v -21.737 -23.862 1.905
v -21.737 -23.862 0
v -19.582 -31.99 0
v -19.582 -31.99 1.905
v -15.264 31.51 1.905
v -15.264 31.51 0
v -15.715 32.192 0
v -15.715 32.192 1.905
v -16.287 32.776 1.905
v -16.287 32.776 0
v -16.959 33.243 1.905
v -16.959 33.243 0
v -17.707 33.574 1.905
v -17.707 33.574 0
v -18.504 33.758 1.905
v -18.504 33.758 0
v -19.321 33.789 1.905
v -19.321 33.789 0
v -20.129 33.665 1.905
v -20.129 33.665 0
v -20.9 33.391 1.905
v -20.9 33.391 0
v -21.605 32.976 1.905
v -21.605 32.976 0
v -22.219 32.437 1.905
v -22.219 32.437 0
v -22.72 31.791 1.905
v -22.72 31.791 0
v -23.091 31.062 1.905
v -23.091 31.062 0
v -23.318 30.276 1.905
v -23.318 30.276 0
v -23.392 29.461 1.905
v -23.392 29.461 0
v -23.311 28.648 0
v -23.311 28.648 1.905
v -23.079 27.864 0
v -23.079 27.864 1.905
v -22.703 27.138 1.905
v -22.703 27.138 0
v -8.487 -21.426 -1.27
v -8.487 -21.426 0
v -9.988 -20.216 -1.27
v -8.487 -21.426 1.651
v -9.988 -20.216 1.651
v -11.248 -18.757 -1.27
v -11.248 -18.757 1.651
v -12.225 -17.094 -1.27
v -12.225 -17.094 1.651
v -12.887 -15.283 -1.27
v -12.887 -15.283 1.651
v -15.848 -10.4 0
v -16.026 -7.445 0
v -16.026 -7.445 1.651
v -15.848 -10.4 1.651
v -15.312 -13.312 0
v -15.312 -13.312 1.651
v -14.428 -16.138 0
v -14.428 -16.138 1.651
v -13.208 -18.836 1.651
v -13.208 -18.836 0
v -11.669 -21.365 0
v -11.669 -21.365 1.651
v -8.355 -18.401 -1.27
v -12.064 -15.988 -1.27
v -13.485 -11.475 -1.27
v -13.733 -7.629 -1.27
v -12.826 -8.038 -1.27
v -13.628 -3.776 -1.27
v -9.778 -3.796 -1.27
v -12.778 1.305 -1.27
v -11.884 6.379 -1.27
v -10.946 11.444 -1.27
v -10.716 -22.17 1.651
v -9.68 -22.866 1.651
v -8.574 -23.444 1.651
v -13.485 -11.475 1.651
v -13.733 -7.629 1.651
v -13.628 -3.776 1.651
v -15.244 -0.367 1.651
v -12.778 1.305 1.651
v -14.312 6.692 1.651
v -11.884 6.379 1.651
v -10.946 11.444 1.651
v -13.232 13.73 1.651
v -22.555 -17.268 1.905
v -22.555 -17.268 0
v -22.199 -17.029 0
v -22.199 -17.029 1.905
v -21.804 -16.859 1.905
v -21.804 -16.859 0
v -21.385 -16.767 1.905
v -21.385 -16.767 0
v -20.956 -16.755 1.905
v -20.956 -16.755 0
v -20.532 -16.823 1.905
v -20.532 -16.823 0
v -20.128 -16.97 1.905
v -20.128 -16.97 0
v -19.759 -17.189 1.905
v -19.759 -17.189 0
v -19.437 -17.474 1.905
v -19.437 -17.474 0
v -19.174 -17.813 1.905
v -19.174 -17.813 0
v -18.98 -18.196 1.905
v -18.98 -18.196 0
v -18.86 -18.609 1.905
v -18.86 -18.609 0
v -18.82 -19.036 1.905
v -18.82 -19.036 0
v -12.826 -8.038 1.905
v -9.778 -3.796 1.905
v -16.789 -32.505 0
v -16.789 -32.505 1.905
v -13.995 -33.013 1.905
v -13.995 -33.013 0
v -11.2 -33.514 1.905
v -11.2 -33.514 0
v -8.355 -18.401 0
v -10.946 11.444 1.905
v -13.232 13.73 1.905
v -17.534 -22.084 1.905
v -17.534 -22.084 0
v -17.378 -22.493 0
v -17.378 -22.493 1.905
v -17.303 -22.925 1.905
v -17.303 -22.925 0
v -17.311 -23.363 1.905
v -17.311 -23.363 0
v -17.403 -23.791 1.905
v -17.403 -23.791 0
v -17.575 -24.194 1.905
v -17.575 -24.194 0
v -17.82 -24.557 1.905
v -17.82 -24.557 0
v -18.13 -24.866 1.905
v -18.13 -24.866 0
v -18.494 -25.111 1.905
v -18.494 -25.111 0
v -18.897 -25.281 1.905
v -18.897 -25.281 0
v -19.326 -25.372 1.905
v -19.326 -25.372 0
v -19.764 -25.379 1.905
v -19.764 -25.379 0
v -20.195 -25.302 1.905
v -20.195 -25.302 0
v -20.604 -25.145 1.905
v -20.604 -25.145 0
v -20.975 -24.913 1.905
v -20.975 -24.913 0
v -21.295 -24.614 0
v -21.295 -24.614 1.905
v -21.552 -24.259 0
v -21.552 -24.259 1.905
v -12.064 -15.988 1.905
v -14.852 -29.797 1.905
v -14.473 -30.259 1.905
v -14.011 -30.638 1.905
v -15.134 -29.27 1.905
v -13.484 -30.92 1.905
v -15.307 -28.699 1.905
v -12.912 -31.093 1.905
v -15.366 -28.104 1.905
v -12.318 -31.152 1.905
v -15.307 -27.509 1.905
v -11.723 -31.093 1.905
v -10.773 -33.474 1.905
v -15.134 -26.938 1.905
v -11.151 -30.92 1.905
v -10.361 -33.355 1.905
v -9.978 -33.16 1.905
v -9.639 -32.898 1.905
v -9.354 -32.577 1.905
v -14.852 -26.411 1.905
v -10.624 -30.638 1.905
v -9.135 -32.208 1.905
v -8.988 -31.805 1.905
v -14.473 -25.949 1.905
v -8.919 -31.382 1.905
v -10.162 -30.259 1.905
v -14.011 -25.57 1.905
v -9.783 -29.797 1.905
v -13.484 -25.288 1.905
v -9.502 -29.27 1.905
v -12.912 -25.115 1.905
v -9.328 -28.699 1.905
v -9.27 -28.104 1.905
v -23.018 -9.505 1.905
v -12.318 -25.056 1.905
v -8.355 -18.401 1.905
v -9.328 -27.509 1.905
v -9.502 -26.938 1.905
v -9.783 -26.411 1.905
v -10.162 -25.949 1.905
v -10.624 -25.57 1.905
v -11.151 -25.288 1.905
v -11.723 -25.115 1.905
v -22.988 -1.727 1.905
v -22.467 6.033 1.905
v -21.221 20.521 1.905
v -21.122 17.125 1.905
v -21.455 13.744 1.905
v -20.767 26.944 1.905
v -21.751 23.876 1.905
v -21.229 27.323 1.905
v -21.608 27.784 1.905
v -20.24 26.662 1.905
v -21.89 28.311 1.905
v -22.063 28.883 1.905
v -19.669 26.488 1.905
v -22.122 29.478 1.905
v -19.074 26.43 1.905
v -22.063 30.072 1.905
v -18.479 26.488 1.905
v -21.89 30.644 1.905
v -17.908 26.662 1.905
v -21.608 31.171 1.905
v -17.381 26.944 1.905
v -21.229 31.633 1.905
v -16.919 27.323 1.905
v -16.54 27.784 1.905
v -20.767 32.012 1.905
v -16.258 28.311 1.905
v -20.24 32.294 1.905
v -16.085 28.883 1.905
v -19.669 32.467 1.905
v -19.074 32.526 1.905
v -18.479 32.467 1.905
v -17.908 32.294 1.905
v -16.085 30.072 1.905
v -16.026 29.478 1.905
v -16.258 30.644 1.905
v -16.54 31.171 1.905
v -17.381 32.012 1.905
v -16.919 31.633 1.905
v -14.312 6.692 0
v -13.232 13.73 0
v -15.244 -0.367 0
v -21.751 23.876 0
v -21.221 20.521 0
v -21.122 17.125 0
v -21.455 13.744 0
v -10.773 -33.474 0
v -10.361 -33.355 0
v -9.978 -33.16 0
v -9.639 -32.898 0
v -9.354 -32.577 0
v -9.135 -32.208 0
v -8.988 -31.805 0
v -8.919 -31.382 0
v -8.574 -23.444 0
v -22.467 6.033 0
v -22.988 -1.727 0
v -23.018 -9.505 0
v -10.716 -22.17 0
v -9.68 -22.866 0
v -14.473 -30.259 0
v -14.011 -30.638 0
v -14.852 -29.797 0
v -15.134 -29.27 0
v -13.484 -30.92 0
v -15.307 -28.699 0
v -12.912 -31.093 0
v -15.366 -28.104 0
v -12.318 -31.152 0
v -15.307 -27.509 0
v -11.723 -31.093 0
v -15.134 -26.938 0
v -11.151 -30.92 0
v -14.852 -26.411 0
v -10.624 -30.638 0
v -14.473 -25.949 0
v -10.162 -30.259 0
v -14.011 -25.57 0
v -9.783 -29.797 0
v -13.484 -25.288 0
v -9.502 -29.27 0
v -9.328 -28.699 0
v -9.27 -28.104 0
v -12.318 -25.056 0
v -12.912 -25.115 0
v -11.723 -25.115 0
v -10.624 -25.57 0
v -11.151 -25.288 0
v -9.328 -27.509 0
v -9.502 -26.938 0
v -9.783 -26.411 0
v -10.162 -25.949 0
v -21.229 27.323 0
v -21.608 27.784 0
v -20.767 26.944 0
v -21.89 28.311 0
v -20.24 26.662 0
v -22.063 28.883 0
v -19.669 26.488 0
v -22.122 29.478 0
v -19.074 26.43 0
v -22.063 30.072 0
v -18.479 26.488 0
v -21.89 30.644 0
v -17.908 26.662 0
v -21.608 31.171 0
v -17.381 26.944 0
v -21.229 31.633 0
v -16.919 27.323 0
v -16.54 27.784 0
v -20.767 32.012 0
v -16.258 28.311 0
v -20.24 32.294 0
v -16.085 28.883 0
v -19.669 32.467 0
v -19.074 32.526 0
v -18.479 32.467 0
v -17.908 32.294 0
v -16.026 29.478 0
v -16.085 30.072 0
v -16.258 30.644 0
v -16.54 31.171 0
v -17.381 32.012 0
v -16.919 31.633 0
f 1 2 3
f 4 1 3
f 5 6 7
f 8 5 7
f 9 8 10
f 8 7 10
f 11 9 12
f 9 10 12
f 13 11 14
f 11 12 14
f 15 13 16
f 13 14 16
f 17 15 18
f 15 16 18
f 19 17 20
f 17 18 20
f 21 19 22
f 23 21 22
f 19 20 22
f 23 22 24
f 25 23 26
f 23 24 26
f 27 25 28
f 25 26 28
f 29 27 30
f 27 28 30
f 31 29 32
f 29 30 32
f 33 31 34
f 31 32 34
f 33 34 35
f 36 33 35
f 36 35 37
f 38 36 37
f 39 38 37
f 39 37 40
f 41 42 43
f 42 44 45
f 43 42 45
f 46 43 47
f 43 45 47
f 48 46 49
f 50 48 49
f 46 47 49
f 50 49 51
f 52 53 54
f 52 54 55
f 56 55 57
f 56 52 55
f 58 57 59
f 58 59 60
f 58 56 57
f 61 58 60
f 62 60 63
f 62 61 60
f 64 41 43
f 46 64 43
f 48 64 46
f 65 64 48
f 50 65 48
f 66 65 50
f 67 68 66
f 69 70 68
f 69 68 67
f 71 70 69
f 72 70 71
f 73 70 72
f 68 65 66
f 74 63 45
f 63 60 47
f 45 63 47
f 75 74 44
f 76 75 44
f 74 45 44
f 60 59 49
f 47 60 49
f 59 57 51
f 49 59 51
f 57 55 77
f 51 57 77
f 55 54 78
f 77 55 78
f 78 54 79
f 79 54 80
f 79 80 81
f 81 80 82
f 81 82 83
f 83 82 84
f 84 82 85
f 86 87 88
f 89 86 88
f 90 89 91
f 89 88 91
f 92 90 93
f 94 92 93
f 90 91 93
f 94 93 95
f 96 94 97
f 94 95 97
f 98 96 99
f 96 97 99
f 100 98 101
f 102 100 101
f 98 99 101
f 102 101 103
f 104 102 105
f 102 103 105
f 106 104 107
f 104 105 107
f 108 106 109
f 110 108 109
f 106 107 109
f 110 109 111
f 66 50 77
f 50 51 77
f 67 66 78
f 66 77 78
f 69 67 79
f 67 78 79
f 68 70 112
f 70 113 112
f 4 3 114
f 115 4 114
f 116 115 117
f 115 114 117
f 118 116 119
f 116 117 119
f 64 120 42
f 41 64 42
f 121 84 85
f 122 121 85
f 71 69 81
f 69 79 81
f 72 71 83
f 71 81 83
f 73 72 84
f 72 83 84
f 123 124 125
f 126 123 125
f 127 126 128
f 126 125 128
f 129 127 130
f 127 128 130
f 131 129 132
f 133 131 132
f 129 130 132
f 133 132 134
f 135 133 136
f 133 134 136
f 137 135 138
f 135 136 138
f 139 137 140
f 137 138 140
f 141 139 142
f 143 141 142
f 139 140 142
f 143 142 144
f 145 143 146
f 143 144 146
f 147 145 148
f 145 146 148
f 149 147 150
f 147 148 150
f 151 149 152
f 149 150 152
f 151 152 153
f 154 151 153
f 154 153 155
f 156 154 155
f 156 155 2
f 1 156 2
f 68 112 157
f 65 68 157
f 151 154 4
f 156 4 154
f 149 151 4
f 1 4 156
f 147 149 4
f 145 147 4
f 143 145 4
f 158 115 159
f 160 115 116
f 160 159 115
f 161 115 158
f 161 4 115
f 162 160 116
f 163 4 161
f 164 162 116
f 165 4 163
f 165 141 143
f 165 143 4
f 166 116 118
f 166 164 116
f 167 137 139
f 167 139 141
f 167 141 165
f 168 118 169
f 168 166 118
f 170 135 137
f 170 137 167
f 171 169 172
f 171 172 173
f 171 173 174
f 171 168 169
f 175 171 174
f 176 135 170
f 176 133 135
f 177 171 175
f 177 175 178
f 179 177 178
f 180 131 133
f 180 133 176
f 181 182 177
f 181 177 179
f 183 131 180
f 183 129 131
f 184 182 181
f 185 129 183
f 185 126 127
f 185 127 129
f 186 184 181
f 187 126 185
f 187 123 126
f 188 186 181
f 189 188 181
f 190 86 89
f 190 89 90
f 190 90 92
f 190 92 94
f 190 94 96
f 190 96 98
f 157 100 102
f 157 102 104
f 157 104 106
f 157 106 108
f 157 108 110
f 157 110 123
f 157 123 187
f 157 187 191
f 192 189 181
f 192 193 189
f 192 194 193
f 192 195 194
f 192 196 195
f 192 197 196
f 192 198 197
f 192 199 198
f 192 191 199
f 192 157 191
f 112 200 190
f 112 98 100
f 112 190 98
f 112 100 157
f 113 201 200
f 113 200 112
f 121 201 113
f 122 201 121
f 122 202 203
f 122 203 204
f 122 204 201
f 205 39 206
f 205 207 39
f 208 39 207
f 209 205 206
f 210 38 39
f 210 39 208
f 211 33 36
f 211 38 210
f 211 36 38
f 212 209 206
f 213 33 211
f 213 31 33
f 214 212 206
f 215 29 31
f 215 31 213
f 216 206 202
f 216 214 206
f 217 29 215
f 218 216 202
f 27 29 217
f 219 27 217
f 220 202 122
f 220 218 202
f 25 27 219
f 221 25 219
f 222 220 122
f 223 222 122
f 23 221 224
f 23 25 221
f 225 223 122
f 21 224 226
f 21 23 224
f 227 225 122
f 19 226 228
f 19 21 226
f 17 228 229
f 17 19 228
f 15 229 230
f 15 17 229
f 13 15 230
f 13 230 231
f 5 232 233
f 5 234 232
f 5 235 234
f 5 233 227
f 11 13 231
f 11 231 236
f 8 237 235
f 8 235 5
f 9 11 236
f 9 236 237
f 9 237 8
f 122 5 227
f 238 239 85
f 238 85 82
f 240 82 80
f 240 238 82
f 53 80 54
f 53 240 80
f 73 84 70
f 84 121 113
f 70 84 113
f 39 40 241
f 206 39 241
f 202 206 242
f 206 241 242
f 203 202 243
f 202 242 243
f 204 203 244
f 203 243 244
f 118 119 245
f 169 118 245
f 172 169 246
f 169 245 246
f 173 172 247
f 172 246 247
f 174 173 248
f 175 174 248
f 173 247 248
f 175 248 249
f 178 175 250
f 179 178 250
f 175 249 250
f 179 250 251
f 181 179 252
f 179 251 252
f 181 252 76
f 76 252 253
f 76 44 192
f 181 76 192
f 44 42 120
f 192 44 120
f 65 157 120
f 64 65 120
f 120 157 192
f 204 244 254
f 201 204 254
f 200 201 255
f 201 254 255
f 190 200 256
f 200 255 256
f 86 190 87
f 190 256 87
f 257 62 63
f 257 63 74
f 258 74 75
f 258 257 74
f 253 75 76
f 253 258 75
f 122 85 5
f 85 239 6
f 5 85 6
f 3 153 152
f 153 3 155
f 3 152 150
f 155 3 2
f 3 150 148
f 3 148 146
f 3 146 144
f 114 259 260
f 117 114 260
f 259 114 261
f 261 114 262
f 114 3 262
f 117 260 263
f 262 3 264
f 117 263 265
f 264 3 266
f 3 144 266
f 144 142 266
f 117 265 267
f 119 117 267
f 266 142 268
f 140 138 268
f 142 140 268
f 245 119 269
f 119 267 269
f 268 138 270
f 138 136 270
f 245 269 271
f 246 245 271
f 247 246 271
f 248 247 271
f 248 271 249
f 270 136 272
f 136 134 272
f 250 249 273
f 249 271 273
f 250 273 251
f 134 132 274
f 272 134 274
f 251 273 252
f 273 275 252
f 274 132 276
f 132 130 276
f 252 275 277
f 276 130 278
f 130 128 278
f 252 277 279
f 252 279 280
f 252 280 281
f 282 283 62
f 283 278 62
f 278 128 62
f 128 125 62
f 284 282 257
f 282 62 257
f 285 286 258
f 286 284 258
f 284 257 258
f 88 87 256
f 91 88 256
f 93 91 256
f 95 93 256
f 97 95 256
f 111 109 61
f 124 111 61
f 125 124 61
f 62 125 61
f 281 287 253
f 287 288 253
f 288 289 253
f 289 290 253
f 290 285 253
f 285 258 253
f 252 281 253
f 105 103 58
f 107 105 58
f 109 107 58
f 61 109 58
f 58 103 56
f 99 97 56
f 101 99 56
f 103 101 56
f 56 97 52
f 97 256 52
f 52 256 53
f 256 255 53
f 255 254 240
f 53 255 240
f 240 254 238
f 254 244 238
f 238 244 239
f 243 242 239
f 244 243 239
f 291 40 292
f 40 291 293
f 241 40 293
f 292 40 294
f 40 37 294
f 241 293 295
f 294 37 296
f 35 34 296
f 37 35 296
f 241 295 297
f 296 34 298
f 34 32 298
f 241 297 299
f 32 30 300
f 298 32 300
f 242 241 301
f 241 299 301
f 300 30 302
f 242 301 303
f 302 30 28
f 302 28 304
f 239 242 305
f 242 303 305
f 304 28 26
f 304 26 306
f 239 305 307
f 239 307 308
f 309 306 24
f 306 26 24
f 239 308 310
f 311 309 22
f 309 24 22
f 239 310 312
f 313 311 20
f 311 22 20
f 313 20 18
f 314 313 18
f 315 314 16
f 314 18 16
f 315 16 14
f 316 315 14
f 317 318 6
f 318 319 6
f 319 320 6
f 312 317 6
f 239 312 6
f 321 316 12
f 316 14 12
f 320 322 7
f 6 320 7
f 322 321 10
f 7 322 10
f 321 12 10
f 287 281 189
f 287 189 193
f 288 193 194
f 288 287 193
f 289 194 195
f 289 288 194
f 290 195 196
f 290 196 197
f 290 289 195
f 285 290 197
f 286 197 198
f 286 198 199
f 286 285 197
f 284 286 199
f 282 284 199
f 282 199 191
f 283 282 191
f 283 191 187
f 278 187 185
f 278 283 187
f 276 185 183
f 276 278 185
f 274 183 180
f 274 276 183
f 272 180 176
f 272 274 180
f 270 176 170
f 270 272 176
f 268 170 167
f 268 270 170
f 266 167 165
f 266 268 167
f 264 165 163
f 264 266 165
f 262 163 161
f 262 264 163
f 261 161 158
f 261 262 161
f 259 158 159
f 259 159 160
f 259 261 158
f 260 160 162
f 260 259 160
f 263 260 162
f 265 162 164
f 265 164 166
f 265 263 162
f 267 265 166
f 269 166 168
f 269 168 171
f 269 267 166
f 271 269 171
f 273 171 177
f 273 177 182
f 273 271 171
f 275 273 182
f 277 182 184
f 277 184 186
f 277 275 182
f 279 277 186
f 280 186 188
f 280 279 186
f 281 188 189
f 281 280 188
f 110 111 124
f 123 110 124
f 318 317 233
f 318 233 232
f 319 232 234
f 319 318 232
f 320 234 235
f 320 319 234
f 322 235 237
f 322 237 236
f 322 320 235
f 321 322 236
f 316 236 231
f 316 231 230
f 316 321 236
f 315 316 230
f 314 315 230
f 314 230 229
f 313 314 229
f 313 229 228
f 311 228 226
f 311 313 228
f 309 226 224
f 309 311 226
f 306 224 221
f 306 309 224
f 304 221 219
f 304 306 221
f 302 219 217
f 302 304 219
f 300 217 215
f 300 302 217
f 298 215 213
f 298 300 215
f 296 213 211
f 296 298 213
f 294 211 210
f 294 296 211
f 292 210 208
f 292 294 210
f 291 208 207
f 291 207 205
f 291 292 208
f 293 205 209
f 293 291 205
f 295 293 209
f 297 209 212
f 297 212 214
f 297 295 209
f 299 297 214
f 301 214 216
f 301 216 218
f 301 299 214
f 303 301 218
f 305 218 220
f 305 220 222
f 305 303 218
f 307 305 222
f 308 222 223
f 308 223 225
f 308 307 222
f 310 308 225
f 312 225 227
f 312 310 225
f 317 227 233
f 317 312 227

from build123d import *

# Parameters (mm, degrees)
SKETCH1_R           = 3.048
BOSS_EXTRUDE1_DEPTH = 1.905
CUT_EXTRUDE2_DEPTH  = 1.651
BOSS_EXTRUDE3_DEPTH = 1.27


with BuildPart() as part:
    # Sketch1 → Boss-Extrude1 (new body)
    with BuildSketch(Plane.XY):
        with BuildLine():
            Line((-13.231934716, 13.729837747), (-15.263934716, 31.509837747))
            ThreePointArc((-15.263934716, 31.509837747), (-21.261976505, 33.200417113), (-22.702706225, 27.137508425))
            ThreePointArc((-22.702706225, 27.137508425), (-21.220829792, 20.52075151), (-21.455464715, 13.744146439))
            ThreePointArc((-21.455464715, 13.744146439), (-22.988481312, -1.727276666), (-22.555391654, -17.268431904))
            ThreePointArc((-22.555391654, -17.268431904), (-20.128095916, -16.969854608), (-18.819934716, -19.036162253))
            Line((-18.819934716, -19.036162253), (-17.534121248, -22.084162253))
            ThreePointArc((-17.534121248, -22.084162253), (-18.691312873, -25.205533652), (-21.737196185, -23.862162253))
            Line((-21.737196185, -23.862162253), (-19.581934716, -31.990162253))
            ThreePointArc((-19.581934716, -31.990162253), (-15.392244863, -32.759368057), (-11.199934716, -33.514162253))
            ThreePointArc((-11.199934716, -33.514162253), (-9.63879843, -32.898087249), (-8.919111875, -31.38192559))
            Line((-8.919111875, -31.38192559), (-8.355134716, -18.401162253))
            Line((-8.355134716, -18.401162253), (-12.063534716, -15.988162253))
            Line((-12.063534716, -15.988162253), (-12.825534716, -8.037962253))
            Line((-12.825534716, -8.037962253), (-9.777534716, -3.796162253))
            Line((-9.777534716, -3.796162253), (-10.945934716, 11.443837747))
            Line((-10.945934716, 11.443837747), (-13.231934716, 13.729837747))
        make_face()
        with Locations((-19.073934716, 29.477837747)):
            Circle(SKETCH1_R, mode=Mode.SUBTRACT)
        with Locations((-12.317534716, -28.103962253)):
            Circle(SKETCH1_R, mode=Mode.SUBTRACT)
    extrude(amount=BOSS_EXTRUDE1_DEPTH)

    # Sketch7 → Cut-Extrude2 (cut)
    with BuildSketch(Plane.XY):
        with BuildLine():
            Line((-10.945934716, 11.443837747), (-13.231934716, 13.729837747))
            ThreePointArc((-13.231934716, 13.729837747), (-14.796876411, 3.164765256), (-16.025932156, -7.444627811))
            ThreePointArc((-16.025932156, -7.444627811), (-14.913011554, -14.738413577), (-11.669461291, -21.365425329))
            ThreePointArc((-11.669461291, -21.365425329), (-10.207206492, -22.532020863), (-8.57425285, -23.444488198))
            Line((-8.57425285, -23.444488198), (-8.486546668, -21.42580149))
            ThreePointArc((-8.486546668, -21.42580149), (-11.247875767, -18.756621385), (-12.886743333, -15.283355784))
            ThreePointArc((-12.886743333, -15.283355784), (-13.652704618, -9.554942708), (-13.628126313, -3.775599409))
            ThreePointArc((-13.628126313, -3.775599409), (-12.336996698, 3.84292494), (-10.945934716, 11.443837747))
        make_face()
    extrude(amount=CUT_EXTRUDE2_DEPTH, mode=Mode.SUBTRACT)

    # Sketch8 → Boss-Extrude3 (add)
    with BuildSketch(Plane(origin=(0, 0, 0), x_dir=(-1, 0, 0), z_dir=(0, 0, -1))):
        with BuildLine():
            Line((8.355134716, -18.401162253), (8.486546668, -21.42580149))
            ThreePointArc((8.486546668, -21.42580149), (11.247875767, -18.756621385), (12.886743333, -15.283355784))
            ThreePointArc((12.886743333, -15.283355784), (13.652704618, -9.554942708), (13.628126313, -3.775599409))
            ThreePointArc((13.628126313, -3.775599409), (12.336996698, 3.84292494), (10.945934716, 11.443837747))
            Line((10.945934716, 11.443837747), (9.777534716, -3.796162253))
            Line((9.777534716, -3.796162253), (12.825534716, -8.037962253))
            Line((12.825534716, -8.037962253), (12.063534716, -15.988162253))
            Line((12.063534716, -15.988162253), (8.355134716, -18.401162253))
        make_face()
    extrude(amount=BOSS_EXTRUDE3_DEPTH)


solid = part.part
